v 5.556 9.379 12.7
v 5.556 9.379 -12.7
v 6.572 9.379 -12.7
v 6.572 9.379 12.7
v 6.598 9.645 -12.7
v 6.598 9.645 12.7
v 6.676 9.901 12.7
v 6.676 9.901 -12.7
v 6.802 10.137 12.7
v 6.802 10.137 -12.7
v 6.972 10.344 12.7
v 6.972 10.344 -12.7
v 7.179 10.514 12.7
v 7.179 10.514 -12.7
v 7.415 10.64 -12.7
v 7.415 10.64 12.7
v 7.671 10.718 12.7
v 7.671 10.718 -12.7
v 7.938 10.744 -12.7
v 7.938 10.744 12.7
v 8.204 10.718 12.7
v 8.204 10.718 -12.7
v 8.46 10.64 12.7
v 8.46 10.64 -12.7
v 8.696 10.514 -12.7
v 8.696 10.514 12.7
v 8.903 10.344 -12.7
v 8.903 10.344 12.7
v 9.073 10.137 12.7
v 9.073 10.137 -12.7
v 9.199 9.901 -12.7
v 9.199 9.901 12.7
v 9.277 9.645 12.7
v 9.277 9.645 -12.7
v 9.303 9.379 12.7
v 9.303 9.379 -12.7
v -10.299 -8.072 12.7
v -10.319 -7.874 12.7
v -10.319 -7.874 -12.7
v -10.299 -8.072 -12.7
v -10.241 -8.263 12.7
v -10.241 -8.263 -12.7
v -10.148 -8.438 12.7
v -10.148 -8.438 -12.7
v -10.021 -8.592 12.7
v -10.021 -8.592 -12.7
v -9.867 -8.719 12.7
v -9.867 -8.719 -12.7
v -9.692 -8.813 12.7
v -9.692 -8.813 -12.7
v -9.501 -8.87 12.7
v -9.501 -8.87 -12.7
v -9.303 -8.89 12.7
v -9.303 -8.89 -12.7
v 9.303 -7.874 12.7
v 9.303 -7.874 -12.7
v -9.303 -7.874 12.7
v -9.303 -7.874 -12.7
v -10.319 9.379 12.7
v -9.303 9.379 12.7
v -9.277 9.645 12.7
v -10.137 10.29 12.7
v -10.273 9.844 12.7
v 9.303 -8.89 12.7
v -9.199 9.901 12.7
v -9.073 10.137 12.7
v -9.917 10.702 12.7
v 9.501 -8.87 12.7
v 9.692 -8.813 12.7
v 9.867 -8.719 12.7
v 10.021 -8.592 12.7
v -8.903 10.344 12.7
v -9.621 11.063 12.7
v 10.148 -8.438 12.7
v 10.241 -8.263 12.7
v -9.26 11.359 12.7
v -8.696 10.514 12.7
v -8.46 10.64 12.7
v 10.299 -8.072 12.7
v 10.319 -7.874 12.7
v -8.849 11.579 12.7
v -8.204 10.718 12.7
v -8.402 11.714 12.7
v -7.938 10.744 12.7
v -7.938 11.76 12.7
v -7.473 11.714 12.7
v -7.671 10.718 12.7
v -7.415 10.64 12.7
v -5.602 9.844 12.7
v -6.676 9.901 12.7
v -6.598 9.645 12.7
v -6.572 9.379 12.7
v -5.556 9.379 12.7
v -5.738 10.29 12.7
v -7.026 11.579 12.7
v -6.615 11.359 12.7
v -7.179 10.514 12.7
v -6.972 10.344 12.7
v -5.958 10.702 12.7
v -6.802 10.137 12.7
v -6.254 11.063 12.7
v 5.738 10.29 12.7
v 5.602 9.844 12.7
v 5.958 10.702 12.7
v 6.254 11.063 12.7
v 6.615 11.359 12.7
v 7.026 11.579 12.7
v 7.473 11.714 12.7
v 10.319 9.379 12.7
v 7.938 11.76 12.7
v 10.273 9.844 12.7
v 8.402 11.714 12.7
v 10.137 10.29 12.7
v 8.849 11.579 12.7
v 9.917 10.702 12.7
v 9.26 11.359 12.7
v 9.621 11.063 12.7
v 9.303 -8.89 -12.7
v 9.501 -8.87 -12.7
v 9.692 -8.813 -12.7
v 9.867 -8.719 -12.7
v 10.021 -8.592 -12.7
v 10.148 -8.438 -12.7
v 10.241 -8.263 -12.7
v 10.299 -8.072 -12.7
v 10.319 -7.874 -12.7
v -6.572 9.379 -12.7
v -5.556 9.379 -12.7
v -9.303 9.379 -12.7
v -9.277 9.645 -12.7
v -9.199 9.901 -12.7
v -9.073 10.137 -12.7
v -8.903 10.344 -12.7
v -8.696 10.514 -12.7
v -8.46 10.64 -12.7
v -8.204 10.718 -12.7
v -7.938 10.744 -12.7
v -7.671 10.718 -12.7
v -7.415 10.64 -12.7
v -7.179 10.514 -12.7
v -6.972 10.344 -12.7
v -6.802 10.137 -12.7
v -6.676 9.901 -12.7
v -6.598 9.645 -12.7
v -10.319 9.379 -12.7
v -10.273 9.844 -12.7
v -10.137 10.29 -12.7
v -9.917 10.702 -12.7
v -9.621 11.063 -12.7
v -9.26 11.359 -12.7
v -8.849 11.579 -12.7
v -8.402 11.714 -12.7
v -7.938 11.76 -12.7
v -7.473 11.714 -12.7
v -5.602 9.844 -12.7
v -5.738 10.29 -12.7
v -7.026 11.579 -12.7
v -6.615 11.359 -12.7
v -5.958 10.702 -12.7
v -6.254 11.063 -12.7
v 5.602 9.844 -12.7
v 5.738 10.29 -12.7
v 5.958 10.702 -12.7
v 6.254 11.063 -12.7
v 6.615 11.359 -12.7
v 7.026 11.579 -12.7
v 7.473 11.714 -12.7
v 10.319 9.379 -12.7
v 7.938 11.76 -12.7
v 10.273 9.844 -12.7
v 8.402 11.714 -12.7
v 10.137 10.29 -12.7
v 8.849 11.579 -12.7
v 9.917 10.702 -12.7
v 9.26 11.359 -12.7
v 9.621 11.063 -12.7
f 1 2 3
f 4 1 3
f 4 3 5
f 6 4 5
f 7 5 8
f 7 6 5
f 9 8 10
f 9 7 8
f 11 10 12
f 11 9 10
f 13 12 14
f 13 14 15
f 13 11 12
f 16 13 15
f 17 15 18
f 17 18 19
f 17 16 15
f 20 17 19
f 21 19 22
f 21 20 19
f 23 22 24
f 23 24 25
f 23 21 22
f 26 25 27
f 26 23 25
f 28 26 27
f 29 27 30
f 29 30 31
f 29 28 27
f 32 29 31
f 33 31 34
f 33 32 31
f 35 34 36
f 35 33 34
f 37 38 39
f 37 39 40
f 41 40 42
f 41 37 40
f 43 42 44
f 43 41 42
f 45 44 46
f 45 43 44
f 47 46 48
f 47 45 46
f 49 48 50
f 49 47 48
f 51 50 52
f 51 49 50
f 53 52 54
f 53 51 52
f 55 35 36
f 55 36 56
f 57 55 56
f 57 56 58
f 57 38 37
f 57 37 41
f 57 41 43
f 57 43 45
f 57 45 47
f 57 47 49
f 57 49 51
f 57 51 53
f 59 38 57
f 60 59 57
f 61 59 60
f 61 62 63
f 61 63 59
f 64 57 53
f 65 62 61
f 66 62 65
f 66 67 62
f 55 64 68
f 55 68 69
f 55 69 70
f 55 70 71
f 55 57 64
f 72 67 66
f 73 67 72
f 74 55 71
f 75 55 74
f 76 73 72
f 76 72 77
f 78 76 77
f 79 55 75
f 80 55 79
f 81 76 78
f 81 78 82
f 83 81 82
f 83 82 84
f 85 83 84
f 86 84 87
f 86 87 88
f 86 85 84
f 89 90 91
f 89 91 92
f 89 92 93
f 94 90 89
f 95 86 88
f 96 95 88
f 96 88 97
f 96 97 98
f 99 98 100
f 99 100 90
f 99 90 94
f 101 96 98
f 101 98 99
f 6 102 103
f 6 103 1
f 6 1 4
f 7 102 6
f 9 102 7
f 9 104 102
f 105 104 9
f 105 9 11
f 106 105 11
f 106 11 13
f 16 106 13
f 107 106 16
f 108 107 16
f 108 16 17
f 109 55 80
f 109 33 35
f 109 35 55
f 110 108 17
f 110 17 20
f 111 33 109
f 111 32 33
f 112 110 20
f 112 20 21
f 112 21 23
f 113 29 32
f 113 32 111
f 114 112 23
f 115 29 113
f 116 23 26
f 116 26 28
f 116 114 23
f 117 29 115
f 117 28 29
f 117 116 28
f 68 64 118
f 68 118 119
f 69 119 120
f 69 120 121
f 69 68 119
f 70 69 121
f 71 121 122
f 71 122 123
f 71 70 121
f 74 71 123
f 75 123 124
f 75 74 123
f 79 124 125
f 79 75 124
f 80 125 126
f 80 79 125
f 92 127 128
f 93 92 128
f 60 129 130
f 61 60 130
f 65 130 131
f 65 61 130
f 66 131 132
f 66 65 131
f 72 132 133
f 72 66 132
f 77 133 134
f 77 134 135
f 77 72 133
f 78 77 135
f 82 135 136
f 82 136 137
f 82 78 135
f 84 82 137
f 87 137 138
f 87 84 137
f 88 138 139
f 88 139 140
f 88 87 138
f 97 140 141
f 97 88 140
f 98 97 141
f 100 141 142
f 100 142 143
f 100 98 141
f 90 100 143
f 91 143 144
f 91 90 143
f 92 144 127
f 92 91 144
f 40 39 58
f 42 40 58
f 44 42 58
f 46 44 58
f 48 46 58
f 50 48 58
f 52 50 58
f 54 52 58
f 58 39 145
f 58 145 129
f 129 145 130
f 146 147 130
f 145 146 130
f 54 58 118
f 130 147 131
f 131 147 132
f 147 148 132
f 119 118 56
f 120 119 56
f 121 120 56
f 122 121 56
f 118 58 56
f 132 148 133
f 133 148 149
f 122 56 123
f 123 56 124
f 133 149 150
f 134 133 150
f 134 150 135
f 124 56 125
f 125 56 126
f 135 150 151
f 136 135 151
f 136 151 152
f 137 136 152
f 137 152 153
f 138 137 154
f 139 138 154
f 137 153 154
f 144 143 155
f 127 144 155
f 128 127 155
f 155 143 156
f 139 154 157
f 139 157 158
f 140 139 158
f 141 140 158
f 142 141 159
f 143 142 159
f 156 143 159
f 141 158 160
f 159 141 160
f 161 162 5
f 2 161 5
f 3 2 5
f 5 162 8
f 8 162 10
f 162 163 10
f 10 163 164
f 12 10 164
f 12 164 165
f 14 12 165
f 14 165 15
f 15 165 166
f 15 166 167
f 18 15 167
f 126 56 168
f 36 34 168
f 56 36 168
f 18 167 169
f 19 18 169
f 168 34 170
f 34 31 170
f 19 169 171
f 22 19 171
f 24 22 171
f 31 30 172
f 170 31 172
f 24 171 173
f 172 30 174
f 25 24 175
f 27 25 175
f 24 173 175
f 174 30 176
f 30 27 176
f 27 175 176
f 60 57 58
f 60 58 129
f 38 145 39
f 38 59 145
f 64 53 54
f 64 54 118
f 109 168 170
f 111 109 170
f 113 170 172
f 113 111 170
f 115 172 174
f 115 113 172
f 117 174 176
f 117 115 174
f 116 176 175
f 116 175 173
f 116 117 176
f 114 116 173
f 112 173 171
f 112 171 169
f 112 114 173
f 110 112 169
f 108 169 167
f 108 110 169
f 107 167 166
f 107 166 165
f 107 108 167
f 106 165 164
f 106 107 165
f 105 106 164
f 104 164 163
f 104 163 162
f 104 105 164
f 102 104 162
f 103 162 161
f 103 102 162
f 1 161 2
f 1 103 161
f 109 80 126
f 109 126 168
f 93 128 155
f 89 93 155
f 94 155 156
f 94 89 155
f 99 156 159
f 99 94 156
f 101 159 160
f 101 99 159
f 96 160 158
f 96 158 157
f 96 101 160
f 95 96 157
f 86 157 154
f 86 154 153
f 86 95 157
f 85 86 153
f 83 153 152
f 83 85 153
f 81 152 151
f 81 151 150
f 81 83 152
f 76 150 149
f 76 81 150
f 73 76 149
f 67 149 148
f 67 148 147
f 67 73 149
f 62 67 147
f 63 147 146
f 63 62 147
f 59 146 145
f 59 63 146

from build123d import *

# Parameters (mm, degrees)
BASE_EXTRUDE_DEPTH = 12.7


with BuildPart() as part:
    # Sketch1 → Base-Extrude (new, symmetric)
    with BuildSketch(Plane.XY):
        with BuildLine():
            Line((-10.31875, 9.37895), (-10.31875, -7.874))
            ThreePointArc((-10.31875, -7.874), (-10.02117049, -8.59242049), (-9.30275, -8.89))
            Line((-9.30275, -8.89), (9.30275, -8.89))
            ThreePointArc((9.30275, -8.89), (10.02117049, -8.59242049), (10.31875, -7.874))
            Line((10.31875, -7.874), (10.31875, 9.37895))
            ThreePointArc((10.31875, 9.37895), (7.9375, 11.7602), (5.55625, 9.37895))
            Line((5.55625, 9.37895), (6.57225, 9.37895))
            ThreePointArc((6.57225, 9.37895), (7.9375, 10.7442), (9.30275, 9.37895))
            Line((9.30275, 9.37895), (9.30275, -7.874))
            Line((9.30275, -7.874), (-9.30275, -7.874))
            Line((-9.30275, -7.874), (-9.30275, 9.37895))
            ThreePointArc((-9.30275, 9.37895), (-7.9375, 10.7442), (-6.57225, 9.37895))
            Line((-6.57225, 9.37895), (-5.55625, 9.37895))
            ThreePointArc((-5.55625, 9.37895), (-7.9375, 11.7602), (-10.31875, 9.37895))
        make_face()
    extrude(amount=BASE_EXTRUDE_DEPTH, both=True)


solid = part.part
